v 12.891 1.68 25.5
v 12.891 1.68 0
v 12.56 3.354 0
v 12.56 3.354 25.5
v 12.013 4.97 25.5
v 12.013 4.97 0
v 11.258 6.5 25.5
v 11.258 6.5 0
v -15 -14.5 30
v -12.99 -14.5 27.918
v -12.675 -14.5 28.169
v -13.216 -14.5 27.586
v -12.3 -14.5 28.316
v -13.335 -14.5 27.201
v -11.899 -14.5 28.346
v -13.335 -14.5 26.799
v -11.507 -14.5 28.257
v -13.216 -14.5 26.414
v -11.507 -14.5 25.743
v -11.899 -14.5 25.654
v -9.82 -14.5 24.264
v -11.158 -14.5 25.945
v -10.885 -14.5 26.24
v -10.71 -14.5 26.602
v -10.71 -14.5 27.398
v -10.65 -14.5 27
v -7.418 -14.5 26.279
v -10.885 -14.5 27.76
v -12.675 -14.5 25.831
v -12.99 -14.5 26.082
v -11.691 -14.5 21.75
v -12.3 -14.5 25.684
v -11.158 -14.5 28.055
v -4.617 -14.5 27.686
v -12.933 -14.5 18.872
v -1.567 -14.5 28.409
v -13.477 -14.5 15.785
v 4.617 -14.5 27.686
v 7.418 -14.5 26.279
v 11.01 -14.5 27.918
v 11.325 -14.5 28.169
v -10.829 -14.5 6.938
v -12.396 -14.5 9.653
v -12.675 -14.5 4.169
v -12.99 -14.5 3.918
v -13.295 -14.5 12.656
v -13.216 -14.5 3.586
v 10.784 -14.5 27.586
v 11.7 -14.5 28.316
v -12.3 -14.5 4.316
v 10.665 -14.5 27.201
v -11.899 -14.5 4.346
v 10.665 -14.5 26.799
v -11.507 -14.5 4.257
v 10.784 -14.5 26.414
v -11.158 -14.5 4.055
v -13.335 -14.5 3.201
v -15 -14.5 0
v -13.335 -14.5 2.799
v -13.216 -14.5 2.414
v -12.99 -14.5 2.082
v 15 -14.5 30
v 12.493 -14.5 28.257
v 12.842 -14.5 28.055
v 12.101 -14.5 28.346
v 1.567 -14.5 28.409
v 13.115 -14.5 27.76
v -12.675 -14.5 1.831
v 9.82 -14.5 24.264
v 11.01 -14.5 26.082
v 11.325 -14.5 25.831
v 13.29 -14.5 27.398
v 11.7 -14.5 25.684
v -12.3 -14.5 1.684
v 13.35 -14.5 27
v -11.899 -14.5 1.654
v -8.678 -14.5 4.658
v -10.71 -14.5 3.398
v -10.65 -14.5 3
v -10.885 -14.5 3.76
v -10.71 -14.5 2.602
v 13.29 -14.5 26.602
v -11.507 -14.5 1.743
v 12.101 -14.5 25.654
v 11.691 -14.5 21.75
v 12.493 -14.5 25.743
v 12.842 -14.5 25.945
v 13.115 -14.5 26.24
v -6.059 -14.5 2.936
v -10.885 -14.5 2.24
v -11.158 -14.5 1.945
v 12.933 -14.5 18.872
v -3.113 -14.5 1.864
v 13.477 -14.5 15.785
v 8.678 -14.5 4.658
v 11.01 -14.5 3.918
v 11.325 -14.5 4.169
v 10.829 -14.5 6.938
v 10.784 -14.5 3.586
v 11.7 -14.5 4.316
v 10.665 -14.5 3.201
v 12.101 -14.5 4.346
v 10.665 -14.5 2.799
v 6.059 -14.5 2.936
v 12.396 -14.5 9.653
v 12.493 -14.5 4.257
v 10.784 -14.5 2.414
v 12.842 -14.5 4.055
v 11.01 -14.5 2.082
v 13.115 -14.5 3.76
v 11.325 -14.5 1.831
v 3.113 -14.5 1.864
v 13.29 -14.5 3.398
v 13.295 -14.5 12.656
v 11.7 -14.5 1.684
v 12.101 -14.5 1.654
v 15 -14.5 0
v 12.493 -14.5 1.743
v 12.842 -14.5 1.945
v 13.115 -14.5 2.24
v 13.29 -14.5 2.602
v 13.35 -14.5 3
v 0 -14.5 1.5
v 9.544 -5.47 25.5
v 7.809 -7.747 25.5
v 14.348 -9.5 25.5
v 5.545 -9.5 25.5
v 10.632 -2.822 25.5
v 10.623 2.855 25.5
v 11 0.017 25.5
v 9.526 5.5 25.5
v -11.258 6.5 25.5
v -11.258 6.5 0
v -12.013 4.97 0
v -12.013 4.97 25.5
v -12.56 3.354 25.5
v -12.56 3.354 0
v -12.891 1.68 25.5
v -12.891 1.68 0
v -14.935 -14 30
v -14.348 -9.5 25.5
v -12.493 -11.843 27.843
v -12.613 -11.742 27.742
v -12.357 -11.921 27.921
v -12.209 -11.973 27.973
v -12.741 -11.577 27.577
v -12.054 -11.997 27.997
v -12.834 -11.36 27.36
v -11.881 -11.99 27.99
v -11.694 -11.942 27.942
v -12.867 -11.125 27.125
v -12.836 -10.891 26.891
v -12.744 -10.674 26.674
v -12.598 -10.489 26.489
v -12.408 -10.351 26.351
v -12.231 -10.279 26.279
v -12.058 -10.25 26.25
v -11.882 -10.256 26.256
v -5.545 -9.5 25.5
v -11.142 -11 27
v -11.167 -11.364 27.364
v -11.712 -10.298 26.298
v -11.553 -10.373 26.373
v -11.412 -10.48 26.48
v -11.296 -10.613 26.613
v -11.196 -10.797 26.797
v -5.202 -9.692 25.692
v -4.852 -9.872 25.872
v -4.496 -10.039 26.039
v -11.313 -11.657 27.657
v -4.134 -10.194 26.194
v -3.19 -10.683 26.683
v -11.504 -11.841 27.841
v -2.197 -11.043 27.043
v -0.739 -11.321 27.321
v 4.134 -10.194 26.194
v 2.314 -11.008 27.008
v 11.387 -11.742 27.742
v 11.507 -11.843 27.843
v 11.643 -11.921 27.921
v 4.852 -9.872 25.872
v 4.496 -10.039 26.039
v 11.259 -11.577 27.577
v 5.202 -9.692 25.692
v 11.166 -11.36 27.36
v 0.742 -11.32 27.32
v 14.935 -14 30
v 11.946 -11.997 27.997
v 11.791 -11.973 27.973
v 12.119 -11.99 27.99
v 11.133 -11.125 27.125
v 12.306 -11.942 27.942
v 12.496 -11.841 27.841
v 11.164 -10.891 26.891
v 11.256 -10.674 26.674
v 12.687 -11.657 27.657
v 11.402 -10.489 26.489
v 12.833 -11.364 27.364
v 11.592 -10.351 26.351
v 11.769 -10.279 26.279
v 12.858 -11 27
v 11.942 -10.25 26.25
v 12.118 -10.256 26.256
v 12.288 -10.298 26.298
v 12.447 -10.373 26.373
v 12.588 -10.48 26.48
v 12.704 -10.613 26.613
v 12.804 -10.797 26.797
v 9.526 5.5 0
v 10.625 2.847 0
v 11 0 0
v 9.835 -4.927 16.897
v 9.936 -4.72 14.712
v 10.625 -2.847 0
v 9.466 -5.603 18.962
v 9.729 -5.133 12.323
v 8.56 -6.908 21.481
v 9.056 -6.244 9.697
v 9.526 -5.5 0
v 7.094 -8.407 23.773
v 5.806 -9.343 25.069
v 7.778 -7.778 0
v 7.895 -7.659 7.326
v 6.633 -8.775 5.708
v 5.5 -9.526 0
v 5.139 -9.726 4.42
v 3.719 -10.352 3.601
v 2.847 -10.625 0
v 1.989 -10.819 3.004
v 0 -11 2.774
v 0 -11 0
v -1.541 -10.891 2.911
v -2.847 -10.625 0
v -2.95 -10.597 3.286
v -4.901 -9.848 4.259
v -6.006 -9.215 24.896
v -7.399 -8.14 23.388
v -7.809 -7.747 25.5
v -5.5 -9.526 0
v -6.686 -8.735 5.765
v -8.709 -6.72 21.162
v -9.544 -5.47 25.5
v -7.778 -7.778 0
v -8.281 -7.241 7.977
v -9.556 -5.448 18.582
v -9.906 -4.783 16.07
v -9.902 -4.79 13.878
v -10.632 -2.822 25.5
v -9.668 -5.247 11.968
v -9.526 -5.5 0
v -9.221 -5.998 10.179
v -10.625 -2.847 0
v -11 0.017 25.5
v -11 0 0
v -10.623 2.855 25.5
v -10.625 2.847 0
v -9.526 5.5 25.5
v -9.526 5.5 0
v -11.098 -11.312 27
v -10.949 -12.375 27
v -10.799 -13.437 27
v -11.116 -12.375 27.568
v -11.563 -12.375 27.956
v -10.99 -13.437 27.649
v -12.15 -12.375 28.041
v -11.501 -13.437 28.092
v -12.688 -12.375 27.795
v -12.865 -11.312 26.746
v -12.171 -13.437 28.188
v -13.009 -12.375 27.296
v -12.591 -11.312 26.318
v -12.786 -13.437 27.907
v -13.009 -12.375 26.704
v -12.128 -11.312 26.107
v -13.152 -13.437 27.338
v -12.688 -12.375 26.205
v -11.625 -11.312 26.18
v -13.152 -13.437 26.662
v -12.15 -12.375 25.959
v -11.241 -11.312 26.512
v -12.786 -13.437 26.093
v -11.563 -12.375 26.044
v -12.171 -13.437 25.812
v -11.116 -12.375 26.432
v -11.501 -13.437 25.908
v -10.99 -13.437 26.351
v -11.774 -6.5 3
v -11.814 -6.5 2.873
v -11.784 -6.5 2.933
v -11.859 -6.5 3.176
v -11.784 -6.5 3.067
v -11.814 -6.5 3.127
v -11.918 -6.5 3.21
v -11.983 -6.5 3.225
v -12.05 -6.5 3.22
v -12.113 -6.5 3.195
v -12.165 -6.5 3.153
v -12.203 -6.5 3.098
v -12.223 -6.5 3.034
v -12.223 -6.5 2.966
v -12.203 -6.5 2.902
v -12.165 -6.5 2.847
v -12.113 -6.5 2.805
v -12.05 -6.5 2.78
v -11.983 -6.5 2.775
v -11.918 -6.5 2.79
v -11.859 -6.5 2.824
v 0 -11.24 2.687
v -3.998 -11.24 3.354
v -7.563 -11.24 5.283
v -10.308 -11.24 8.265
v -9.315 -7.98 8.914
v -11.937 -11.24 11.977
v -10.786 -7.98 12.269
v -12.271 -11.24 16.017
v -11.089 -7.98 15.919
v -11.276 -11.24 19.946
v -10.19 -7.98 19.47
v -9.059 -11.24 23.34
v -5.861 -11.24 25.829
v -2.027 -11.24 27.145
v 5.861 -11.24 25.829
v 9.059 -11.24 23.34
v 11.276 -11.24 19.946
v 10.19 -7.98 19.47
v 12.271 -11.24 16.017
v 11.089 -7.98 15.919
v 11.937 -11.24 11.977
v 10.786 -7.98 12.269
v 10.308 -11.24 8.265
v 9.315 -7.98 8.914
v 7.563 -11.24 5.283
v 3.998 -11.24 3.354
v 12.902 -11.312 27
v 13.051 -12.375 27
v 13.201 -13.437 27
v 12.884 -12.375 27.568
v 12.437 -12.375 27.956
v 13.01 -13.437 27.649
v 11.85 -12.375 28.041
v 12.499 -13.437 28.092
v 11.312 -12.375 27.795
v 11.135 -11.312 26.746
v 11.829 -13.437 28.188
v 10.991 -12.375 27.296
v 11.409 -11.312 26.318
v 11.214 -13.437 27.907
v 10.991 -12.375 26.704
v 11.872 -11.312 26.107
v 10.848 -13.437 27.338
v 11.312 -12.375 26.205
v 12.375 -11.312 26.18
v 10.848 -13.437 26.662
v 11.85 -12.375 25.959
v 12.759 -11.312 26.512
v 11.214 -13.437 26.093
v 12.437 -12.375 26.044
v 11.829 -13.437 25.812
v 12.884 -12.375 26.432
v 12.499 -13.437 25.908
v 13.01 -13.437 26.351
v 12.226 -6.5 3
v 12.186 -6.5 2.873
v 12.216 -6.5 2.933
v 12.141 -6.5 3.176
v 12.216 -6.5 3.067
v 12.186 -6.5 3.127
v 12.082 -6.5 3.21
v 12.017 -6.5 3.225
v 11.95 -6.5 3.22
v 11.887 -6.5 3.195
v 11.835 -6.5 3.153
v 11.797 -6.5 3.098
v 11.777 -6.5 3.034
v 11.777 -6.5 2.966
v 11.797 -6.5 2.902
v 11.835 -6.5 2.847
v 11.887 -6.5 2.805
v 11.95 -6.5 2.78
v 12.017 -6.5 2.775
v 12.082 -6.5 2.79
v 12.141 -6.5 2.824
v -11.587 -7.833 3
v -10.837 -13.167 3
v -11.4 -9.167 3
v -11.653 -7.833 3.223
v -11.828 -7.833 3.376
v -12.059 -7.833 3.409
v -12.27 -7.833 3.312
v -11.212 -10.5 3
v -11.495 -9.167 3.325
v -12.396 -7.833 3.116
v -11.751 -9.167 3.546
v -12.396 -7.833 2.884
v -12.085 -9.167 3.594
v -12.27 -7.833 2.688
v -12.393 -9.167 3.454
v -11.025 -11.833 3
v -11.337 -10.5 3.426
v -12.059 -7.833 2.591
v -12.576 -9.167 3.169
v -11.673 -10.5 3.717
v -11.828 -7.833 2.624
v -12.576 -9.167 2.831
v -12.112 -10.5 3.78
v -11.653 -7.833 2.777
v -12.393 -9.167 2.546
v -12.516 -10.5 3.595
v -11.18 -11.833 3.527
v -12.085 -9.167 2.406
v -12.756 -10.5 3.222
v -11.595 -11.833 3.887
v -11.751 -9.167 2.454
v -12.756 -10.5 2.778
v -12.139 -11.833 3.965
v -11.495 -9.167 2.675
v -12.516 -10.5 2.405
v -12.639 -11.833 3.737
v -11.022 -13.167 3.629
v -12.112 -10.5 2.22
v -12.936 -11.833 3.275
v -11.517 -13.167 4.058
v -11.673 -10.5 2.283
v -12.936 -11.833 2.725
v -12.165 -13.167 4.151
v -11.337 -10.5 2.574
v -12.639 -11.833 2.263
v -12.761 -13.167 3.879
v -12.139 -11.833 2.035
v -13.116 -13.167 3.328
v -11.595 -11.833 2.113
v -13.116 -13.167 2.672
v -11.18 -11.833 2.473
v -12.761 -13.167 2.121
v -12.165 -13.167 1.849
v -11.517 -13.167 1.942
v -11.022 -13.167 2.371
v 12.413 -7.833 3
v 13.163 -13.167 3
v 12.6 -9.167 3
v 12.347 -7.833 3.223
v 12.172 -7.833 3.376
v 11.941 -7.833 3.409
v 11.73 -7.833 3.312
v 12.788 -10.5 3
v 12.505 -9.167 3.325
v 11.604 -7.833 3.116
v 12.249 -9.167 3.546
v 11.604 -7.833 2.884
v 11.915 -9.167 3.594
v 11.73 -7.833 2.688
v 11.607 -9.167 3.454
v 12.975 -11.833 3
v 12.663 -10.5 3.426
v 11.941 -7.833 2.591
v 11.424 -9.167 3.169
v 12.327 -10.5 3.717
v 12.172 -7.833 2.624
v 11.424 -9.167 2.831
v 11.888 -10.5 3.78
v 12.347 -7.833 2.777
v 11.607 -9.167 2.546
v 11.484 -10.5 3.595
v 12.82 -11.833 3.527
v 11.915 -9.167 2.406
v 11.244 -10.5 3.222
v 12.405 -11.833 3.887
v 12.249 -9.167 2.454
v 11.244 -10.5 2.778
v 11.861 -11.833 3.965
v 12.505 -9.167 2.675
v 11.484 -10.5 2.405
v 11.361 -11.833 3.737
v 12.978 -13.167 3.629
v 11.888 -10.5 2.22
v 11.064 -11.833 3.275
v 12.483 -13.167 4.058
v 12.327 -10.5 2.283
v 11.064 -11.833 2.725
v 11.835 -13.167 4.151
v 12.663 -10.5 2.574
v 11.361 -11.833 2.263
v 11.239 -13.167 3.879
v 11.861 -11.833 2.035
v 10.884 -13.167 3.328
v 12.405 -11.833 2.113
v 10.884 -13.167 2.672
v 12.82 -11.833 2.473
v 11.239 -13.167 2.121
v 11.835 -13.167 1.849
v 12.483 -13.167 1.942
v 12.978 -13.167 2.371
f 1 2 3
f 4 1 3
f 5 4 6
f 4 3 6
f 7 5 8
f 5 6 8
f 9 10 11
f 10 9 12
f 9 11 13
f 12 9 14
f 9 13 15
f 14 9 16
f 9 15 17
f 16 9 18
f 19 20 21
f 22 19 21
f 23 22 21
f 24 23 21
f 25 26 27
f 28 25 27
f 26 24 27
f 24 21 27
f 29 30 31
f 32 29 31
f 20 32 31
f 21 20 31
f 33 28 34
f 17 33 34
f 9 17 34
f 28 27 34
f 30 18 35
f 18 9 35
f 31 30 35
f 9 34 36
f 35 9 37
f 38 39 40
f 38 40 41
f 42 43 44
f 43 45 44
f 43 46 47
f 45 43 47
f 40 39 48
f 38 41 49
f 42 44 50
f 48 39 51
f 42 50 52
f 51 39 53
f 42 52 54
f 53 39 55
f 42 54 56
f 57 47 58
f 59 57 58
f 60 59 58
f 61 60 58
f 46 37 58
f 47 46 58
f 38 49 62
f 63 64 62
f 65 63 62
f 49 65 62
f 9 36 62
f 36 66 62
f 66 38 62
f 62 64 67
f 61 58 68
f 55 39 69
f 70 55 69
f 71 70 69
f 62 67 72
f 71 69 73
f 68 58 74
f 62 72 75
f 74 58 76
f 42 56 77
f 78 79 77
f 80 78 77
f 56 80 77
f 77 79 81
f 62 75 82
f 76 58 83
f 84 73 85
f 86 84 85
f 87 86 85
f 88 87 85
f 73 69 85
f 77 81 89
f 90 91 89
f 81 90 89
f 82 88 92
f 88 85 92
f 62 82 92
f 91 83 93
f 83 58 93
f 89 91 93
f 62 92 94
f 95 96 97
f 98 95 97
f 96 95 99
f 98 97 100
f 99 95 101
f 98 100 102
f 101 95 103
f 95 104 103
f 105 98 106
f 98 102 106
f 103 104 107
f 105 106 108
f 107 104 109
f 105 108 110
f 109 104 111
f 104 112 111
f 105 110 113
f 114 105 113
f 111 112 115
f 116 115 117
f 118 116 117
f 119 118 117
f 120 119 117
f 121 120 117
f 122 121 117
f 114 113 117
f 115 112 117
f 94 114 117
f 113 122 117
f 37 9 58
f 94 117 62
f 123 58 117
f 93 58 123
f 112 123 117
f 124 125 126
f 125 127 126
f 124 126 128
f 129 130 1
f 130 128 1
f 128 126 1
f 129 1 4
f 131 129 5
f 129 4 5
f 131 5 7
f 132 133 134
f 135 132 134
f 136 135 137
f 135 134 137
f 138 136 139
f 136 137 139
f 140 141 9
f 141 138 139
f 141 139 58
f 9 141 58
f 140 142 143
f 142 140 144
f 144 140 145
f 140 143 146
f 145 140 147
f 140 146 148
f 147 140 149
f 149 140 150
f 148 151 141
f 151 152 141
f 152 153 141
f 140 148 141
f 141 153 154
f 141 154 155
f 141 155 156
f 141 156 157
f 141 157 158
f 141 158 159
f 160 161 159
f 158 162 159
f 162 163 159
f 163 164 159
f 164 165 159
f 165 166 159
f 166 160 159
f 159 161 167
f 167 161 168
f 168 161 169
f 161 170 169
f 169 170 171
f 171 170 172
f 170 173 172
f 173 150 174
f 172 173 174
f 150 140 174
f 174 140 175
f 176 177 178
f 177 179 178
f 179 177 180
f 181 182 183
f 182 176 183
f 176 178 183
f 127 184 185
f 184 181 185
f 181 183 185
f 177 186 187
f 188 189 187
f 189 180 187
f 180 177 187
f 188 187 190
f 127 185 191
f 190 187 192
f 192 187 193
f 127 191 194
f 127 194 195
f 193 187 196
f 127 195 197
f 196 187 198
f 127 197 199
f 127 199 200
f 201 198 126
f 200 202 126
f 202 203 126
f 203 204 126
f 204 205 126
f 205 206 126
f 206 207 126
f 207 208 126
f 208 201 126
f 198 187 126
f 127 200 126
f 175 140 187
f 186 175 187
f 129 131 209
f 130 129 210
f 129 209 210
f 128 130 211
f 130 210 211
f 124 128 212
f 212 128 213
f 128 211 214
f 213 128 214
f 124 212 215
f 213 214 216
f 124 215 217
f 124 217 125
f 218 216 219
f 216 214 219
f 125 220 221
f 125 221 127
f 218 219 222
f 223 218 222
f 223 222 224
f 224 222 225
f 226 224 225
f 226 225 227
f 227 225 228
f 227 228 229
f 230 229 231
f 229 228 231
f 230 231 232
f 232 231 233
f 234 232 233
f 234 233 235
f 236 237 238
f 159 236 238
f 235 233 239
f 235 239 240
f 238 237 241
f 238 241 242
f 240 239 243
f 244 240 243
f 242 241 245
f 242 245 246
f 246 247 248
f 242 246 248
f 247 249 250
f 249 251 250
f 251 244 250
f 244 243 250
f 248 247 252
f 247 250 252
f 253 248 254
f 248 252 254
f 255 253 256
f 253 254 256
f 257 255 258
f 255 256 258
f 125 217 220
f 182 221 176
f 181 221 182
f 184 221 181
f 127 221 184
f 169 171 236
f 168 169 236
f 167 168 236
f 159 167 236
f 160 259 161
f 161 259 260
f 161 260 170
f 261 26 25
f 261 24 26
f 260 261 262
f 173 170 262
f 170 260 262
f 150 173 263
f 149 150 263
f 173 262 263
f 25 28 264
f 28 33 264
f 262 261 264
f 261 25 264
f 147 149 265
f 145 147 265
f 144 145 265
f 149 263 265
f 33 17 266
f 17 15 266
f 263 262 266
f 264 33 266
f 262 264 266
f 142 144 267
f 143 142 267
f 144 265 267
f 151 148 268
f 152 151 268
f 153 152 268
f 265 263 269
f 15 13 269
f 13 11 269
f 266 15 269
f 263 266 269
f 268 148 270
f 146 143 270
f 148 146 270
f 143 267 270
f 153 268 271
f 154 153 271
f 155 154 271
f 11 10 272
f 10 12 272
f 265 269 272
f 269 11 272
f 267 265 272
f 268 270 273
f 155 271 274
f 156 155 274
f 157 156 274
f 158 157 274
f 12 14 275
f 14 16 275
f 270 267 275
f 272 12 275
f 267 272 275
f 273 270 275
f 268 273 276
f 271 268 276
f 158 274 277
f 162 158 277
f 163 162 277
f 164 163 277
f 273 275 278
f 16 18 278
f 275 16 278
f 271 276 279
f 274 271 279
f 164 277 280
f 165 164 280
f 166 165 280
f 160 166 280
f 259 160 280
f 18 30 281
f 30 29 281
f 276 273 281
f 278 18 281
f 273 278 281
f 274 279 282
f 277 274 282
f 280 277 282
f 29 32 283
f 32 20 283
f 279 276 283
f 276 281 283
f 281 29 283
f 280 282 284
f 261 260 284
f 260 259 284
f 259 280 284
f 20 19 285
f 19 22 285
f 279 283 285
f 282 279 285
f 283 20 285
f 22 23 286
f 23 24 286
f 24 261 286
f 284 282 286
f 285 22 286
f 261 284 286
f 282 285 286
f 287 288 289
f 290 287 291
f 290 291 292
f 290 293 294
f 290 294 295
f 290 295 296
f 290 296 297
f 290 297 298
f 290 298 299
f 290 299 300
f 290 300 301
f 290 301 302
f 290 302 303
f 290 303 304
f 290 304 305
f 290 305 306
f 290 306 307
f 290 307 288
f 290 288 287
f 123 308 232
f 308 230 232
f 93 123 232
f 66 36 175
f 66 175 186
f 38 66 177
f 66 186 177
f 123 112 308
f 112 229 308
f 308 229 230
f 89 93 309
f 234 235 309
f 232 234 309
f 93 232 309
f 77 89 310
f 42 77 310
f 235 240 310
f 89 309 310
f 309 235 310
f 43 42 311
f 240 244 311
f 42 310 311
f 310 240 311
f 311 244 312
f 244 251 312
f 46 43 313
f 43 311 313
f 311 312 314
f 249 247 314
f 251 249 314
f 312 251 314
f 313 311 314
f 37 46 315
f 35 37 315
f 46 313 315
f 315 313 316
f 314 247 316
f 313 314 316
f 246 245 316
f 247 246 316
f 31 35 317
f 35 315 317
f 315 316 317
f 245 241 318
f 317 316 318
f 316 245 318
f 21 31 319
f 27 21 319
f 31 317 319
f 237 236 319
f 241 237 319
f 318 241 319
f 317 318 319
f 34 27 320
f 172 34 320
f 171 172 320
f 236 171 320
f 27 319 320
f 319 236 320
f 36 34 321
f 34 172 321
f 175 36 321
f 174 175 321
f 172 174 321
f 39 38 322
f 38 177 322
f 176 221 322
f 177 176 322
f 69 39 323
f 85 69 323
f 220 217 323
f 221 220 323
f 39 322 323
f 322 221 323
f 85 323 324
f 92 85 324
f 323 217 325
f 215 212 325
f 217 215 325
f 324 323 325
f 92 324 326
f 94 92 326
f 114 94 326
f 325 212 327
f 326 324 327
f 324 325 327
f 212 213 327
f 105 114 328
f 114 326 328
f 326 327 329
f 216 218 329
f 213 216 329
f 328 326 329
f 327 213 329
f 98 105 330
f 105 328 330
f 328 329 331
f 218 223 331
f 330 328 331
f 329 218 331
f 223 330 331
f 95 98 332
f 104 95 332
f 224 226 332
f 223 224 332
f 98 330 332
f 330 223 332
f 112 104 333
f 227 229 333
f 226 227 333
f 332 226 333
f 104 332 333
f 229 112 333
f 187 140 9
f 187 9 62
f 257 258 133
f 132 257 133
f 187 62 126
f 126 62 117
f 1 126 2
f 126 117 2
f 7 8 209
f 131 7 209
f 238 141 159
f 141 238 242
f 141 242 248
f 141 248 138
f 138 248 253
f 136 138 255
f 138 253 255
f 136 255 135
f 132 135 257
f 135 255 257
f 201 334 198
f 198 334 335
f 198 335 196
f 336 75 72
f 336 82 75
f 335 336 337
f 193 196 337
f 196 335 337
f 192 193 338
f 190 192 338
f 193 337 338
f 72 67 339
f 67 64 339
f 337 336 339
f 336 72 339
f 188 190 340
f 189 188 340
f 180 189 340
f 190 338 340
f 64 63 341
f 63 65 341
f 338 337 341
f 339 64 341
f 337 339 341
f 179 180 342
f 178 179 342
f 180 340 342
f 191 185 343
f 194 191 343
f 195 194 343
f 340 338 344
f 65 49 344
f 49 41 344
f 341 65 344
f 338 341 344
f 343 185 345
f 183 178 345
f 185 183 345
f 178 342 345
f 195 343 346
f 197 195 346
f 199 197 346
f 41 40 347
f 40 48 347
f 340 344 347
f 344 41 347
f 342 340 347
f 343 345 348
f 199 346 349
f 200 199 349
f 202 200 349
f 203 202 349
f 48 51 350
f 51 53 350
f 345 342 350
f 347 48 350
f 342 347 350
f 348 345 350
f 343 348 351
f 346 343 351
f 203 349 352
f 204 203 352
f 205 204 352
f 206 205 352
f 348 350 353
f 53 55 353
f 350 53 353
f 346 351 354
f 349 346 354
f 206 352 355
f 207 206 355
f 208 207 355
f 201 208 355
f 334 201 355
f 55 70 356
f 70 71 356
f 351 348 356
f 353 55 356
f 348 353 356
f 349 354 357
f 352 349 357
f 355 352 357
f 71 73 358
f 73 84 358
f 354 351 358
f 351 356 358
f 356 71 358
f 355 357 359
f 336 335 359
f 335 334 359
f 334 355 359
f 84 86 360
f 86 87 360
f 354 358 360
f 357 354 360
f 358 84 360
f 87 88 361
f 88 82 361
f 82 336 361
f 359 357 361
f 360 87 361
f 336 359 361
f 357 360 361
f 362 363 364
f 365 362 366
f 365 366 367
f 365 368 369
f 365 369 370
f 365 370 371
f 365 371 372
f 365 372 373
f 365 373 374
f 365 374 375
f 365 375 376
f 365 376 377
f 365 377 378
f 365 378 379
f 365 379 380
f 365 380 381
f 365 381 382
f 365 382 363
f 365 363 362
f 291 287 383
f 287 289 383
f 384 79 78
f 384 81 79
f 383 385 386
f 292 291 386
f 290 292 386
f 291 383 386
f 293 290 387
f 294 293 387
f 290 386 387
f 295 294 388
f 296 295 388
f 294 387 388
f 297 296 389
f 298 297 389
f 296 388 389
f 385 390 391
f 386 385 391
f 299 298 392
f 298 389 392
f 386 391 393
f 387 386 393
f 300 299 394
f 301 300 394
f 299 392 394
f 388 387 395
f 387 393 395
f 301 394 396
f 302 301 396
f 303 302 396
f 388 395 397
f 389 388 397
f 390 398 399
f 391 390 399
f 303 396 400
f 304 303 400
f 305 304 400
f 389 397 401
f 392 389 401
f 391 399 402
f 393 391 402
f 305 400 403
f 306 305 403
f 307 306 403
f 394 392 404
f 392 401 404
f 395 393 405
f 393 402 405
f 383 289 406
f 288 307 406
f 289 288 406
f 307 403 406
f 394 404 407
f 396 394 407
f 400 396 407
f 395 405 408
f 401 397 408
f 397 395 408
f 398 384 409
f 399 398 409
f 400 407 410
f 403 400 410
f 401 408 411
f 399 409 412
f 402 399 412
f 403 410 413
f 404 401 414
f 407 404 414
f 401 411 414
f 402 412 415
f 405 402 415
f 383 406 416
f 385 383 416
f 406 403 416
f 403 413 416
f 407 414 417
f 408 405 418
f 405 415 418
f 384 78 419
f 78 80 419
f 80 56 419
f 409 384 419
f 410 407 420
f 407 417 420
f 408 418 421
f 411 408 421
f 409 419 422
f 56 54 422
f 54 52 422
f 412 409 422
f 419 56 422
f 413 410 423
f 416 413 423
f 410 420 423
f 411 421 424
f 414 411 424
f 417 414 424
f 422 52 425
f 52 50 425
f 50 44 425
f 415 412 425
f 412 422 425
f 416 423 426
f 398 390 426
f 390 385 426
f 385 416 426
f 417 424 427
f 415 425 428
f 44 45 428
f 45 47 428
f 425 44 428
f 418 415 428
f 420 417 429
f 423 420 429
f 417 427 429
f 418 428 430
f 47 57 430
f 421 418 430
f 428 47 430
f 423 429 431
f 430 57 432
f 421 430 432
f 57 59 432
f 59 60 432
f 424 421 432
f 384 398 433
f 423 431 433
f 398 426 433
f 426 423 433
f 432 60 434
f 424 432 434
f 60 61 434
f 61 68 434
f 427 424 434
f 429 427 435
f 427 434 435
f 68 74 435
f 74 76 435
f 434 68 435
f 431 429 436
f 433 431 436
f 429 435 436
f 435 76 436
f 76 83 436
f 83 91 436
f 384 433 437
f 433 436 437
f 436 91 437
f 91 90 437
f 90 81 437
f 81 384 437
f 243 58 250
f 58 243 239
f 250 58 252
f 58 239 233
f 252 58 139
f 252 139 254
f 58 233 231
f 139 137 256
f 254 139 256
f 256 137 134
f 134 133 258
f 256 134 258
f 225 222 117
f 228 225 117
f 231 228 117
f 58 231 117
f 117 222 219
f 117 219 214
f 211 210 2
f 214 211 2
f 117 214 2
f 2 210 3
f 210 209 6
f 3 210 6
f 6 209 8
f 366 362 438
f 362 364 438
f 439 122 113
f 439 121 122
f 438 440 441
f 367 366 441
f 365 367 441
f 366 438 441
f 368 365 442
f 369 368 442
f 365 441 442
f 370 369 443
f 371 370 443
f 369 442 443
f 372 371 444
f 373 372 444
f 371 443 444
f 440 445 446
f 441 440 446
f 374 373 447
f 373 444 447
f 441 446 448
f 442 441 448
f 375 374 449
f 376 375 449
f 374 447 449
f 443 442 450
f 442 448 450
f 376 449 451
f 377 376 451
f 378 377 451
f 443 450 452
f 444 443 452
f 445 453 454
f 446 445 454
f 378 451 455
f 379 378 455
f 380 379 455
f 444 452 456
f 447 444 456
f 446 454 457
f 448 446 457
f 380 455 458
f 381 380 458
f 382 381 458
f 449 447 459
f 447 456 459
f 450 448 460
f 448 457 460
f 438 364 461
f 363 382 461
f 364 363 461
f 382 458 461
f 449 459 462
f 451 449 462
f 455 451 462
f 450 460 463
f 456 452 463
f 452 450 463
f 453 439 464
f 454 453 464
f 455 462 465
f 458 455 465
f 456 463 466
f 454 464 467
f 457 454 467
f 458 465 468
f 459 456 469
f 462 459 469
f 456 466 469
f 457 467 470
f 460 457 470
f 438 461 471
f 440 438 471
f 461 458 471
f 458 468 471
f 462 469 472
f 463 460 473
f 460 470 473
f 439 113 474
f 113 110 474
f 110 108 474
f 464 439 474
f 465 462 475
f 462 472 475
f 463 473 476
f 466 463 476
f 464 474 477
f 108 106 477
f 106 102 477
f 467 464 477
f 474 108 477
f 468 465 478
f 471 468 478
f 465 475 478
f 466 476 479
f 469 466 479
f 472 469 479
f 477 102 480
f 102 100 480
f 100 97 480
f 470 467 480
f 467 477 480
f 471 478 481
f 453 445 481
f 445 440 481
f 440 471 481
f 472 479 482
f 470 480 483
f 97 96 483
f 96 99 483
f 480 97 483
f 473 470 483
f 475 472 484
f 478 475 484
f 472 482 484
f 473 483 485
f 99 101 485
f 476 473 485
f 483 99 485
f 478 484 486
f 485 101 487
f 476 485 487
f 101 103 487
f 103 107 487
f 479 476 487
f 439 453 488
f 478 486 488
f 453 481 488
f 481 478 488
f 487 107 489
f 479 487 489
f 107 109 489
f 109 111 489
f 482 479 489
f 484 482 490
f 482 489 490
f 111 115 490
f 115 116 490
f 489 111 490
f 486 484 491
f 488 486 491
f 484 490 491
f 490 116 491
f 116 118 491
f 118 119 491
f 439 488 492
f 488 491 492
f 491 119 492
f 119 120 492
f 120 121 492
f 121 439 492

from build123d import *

# Parameters (mm, degrees)
EXTRUDE_1_DEPTH               = 30
CUT_EXTRUDE_1_DEPTH           = 25
SKETCH_4_R                    = 1.35
CUT_EXTRUDE_3_DEPTH           = 8
CUT_EXTRUDE_3_DRAFT           = -8
CUT_EXTRUDE_3_PROFILE_2_DEPTH = 8
CUT_EXTRUDE_3_PROFILE_2_DRAFT = -8
CUT_EXTRUDE_3_PROFILE_3_DEPTH = 8
CUT_EXTRUDE_3_PROFILE_3_DRAFT = -8
CUT_EXTRUDE_3_PROFILE_4_DEPTH = 8
CUT_EXTRUDE_3_PROFILE_4_DRAFT = -8


with BuildPart() as part:
    # 草图1 → 凸台-拉伸1 (new body)
    with BuildSketch(Plane.XY):
        with BuildLine():
            Line((-9.526279442, 5.5), (-11.258330249, 6.5))
            ThreePointArc((-11.258330249, 6.5), (-12.31277123, 4.170811027), (-12.890950792, 1.680293923))
            Line((-12.890950792, 1.680293923), (-15, -14.5))
            Line((-15, -14.5), (15, -14.5))
            Line((15, -14.5), (12.890950792, 1.680293923))
            ThreePointArc((12.890950792, 1.680293923), (12.31277123, 4.170811027), (11.258330249, 6.5))
            Line((11.258330249, 6.5), (9.526279442, 5.5))
            ThreePointArc((9.526279442, 5.5), (0, -11), (-9.526279442, 5.5))
        make_face()
    extrude(amount=EXTRUDE_1_DEPTH)

    # 草图2 → 切除-拉伸1 (cut, symmetric)
    with BuildSketch(Plane(origin=(0, 0, 0), x_dir=(0, 0, -1), z_dir=(1, 0, 0))):
        Polygon((-30, -14), (-25.5, -9.5), (-25.5, 7.359440669), (-30, 7.359440669), align=None)
    extrude(amount=CUT_EXTRUDE_1_DEPTH, both=True, mode=Mode.SUBTRACT)

    # 切除-拉伸2 cone 1 section (through the dimple's axis) → 切除-拉伸2 (revolve, cut)
    with BuildSketch(Plane(origin=(0, -14.5, 15), x_dir=(0, 0, -1), z_dir=(1, 0, 0))):
        Polygon((0, 0), (13.5, 0), (0, 37.090945163), align=None)
    revolve(axis=Axis((0, -14.5, 15), (0, 1, 0)), mode=Mode.SUBTRACT)


with BuildPart() as cut_extrude_3_tool:
    # 草图4 → 切除-拉伸3 (with draft: the straight prism first)
    with BuildSketch(Plane.XZ.offset(14.5)):
        with Locations((-12, 27)):
            Circle(SKETCH_4_R)
    extrude(amount=-CUT_EXTRUDE_3_DEPTH)
    # 切除-拉伸3: the draft: its side faces are tilted about the plane it starts from
    cut_extrude_3_sides = [cut_extrude_3_tool.faces().sort_by_distance(p)[0] for p in [
        (-13.35, -10.5, 27),
    ]]
    draft(cut_extrude_3_sides, Plane.XZ.offset(14.5), CUT_EXTRUDE_3_DRAFT)


with BuildPart() as part_1:
    add(part.part)

    # 切除-拉伸3: cut by cut_extrude_3_tool
    add(cut_extrude_3_tool.part, mode=Mode.SUBTRACT)


with BuildPart() as cut_extrude_3_profile_2_tool:
    # 草图4 → 切除-拉伸3 profile 2 (with draft: the straight prism first)
    with BuildSketch(Plane.XZ.offset(14.5)):
        with Locations((12, 27)):
            Circle(SKETCH_4_R)
    extrude(amount=-CUT_EXTRUDE_3_PROFILE_2_DEPTH)
    # 切除-拉伸3 profile 2: the draft: its side faces are tilted about the plane it starts from
    cut_extrude_3_profile_2_sides = [cut_extrude_3_profile_2_tool.faces().sort_by_distance(p)[0] for p in [
        (10.65, -10.5, 27),
    ]]
    draft(cut_extrude_3_profile_2_sides, Plane.XZ.offset(14.5), CUT_EXTRUDE_3_PROFILE_2_DRAFT)


with BuildPart() as part_2:
    add(part_1.part)

    # 切除-拉伸3 profile 2: cut by cut_extrude_3_profile_2_tool
    add(cut_extrude_3_profile_2_tool.part, mode=Mode.SUBTRACT)


with BuildPart() as cut_extrude_3_profile_3_tool:
    # 草图4 → 切除-拉伸3 profile 3 (with draft: the straight prism first)
    with BuildSketch(Plane.XZ.offset(14.5)):
        with Locations((-12, 3)):
            Circle(SKETCH_4_R)
    extrude(amount=-CUT_EXTRUDE_3_PROFILE_3_DEPTH)
    # 切除-拉伸3 profile 3: the draft: its side faces are tilted about the plane it starts from
    cut_extrude_3_profile_3_sides = [cut_extrude_3_profile_3_tool.faces().sort_by_distance(p)[0] for p in [
        (-13.35, -10.5, 3),
    ]]
    draft(cut_extrude_3_profile_3_sides, Plane.XZ.offset(14.5), CUT_EXTRUDE_3_PROFILE_3_DRAFT)


with BuildPart() as part_3:
    add(part_2.part)

    # 切除-拉伸3 profile 3: cut by cut_extrude_3_profile_3_tool
    add(cut_extrude_3_profile_3_tool.part, mode=Mode.SUBTRACT)


with BuildPart() as cut_extrude_3_profile_4_tool:
    # 草图4 → 切除-拉伸3 profile 4 (with draft: the straight prism first)
    with BuildSketch(Plane.XZ.offset(14.5)):
        with Locations((12, 3)):
            Circle(SKETCH_4_R)
    extrude(amount=-CUT_EXTRUDE_3_PROFILE_4_DEPTH)
    # 切除-拉伸3 profile 4: the draft: its side faces are tilted about the plane it starts from
    cut_extrude_3_profile_4_sides = [cut_extrude_3_profile_4_tool.faces().sort_by_distance(p)[0] for p in [
        (10.65, -10.5, 3),
    ]]
    draft(cut_extrude_3_profile_4_sides, Plane.XZ.offset(14.5), CUT_EXTRUDE_3_PROFILE_4_DRAFT)


with BuildPart() as part_4:
    add(part_3.part)

    # 切除-拉伸3 profile 4: cut by cut_extrude_3_profile_4_tool
    add(cut_extrude_3_profile_4_tool.part, mode=Mode.SUBTRACT)


solid = part_4.part
